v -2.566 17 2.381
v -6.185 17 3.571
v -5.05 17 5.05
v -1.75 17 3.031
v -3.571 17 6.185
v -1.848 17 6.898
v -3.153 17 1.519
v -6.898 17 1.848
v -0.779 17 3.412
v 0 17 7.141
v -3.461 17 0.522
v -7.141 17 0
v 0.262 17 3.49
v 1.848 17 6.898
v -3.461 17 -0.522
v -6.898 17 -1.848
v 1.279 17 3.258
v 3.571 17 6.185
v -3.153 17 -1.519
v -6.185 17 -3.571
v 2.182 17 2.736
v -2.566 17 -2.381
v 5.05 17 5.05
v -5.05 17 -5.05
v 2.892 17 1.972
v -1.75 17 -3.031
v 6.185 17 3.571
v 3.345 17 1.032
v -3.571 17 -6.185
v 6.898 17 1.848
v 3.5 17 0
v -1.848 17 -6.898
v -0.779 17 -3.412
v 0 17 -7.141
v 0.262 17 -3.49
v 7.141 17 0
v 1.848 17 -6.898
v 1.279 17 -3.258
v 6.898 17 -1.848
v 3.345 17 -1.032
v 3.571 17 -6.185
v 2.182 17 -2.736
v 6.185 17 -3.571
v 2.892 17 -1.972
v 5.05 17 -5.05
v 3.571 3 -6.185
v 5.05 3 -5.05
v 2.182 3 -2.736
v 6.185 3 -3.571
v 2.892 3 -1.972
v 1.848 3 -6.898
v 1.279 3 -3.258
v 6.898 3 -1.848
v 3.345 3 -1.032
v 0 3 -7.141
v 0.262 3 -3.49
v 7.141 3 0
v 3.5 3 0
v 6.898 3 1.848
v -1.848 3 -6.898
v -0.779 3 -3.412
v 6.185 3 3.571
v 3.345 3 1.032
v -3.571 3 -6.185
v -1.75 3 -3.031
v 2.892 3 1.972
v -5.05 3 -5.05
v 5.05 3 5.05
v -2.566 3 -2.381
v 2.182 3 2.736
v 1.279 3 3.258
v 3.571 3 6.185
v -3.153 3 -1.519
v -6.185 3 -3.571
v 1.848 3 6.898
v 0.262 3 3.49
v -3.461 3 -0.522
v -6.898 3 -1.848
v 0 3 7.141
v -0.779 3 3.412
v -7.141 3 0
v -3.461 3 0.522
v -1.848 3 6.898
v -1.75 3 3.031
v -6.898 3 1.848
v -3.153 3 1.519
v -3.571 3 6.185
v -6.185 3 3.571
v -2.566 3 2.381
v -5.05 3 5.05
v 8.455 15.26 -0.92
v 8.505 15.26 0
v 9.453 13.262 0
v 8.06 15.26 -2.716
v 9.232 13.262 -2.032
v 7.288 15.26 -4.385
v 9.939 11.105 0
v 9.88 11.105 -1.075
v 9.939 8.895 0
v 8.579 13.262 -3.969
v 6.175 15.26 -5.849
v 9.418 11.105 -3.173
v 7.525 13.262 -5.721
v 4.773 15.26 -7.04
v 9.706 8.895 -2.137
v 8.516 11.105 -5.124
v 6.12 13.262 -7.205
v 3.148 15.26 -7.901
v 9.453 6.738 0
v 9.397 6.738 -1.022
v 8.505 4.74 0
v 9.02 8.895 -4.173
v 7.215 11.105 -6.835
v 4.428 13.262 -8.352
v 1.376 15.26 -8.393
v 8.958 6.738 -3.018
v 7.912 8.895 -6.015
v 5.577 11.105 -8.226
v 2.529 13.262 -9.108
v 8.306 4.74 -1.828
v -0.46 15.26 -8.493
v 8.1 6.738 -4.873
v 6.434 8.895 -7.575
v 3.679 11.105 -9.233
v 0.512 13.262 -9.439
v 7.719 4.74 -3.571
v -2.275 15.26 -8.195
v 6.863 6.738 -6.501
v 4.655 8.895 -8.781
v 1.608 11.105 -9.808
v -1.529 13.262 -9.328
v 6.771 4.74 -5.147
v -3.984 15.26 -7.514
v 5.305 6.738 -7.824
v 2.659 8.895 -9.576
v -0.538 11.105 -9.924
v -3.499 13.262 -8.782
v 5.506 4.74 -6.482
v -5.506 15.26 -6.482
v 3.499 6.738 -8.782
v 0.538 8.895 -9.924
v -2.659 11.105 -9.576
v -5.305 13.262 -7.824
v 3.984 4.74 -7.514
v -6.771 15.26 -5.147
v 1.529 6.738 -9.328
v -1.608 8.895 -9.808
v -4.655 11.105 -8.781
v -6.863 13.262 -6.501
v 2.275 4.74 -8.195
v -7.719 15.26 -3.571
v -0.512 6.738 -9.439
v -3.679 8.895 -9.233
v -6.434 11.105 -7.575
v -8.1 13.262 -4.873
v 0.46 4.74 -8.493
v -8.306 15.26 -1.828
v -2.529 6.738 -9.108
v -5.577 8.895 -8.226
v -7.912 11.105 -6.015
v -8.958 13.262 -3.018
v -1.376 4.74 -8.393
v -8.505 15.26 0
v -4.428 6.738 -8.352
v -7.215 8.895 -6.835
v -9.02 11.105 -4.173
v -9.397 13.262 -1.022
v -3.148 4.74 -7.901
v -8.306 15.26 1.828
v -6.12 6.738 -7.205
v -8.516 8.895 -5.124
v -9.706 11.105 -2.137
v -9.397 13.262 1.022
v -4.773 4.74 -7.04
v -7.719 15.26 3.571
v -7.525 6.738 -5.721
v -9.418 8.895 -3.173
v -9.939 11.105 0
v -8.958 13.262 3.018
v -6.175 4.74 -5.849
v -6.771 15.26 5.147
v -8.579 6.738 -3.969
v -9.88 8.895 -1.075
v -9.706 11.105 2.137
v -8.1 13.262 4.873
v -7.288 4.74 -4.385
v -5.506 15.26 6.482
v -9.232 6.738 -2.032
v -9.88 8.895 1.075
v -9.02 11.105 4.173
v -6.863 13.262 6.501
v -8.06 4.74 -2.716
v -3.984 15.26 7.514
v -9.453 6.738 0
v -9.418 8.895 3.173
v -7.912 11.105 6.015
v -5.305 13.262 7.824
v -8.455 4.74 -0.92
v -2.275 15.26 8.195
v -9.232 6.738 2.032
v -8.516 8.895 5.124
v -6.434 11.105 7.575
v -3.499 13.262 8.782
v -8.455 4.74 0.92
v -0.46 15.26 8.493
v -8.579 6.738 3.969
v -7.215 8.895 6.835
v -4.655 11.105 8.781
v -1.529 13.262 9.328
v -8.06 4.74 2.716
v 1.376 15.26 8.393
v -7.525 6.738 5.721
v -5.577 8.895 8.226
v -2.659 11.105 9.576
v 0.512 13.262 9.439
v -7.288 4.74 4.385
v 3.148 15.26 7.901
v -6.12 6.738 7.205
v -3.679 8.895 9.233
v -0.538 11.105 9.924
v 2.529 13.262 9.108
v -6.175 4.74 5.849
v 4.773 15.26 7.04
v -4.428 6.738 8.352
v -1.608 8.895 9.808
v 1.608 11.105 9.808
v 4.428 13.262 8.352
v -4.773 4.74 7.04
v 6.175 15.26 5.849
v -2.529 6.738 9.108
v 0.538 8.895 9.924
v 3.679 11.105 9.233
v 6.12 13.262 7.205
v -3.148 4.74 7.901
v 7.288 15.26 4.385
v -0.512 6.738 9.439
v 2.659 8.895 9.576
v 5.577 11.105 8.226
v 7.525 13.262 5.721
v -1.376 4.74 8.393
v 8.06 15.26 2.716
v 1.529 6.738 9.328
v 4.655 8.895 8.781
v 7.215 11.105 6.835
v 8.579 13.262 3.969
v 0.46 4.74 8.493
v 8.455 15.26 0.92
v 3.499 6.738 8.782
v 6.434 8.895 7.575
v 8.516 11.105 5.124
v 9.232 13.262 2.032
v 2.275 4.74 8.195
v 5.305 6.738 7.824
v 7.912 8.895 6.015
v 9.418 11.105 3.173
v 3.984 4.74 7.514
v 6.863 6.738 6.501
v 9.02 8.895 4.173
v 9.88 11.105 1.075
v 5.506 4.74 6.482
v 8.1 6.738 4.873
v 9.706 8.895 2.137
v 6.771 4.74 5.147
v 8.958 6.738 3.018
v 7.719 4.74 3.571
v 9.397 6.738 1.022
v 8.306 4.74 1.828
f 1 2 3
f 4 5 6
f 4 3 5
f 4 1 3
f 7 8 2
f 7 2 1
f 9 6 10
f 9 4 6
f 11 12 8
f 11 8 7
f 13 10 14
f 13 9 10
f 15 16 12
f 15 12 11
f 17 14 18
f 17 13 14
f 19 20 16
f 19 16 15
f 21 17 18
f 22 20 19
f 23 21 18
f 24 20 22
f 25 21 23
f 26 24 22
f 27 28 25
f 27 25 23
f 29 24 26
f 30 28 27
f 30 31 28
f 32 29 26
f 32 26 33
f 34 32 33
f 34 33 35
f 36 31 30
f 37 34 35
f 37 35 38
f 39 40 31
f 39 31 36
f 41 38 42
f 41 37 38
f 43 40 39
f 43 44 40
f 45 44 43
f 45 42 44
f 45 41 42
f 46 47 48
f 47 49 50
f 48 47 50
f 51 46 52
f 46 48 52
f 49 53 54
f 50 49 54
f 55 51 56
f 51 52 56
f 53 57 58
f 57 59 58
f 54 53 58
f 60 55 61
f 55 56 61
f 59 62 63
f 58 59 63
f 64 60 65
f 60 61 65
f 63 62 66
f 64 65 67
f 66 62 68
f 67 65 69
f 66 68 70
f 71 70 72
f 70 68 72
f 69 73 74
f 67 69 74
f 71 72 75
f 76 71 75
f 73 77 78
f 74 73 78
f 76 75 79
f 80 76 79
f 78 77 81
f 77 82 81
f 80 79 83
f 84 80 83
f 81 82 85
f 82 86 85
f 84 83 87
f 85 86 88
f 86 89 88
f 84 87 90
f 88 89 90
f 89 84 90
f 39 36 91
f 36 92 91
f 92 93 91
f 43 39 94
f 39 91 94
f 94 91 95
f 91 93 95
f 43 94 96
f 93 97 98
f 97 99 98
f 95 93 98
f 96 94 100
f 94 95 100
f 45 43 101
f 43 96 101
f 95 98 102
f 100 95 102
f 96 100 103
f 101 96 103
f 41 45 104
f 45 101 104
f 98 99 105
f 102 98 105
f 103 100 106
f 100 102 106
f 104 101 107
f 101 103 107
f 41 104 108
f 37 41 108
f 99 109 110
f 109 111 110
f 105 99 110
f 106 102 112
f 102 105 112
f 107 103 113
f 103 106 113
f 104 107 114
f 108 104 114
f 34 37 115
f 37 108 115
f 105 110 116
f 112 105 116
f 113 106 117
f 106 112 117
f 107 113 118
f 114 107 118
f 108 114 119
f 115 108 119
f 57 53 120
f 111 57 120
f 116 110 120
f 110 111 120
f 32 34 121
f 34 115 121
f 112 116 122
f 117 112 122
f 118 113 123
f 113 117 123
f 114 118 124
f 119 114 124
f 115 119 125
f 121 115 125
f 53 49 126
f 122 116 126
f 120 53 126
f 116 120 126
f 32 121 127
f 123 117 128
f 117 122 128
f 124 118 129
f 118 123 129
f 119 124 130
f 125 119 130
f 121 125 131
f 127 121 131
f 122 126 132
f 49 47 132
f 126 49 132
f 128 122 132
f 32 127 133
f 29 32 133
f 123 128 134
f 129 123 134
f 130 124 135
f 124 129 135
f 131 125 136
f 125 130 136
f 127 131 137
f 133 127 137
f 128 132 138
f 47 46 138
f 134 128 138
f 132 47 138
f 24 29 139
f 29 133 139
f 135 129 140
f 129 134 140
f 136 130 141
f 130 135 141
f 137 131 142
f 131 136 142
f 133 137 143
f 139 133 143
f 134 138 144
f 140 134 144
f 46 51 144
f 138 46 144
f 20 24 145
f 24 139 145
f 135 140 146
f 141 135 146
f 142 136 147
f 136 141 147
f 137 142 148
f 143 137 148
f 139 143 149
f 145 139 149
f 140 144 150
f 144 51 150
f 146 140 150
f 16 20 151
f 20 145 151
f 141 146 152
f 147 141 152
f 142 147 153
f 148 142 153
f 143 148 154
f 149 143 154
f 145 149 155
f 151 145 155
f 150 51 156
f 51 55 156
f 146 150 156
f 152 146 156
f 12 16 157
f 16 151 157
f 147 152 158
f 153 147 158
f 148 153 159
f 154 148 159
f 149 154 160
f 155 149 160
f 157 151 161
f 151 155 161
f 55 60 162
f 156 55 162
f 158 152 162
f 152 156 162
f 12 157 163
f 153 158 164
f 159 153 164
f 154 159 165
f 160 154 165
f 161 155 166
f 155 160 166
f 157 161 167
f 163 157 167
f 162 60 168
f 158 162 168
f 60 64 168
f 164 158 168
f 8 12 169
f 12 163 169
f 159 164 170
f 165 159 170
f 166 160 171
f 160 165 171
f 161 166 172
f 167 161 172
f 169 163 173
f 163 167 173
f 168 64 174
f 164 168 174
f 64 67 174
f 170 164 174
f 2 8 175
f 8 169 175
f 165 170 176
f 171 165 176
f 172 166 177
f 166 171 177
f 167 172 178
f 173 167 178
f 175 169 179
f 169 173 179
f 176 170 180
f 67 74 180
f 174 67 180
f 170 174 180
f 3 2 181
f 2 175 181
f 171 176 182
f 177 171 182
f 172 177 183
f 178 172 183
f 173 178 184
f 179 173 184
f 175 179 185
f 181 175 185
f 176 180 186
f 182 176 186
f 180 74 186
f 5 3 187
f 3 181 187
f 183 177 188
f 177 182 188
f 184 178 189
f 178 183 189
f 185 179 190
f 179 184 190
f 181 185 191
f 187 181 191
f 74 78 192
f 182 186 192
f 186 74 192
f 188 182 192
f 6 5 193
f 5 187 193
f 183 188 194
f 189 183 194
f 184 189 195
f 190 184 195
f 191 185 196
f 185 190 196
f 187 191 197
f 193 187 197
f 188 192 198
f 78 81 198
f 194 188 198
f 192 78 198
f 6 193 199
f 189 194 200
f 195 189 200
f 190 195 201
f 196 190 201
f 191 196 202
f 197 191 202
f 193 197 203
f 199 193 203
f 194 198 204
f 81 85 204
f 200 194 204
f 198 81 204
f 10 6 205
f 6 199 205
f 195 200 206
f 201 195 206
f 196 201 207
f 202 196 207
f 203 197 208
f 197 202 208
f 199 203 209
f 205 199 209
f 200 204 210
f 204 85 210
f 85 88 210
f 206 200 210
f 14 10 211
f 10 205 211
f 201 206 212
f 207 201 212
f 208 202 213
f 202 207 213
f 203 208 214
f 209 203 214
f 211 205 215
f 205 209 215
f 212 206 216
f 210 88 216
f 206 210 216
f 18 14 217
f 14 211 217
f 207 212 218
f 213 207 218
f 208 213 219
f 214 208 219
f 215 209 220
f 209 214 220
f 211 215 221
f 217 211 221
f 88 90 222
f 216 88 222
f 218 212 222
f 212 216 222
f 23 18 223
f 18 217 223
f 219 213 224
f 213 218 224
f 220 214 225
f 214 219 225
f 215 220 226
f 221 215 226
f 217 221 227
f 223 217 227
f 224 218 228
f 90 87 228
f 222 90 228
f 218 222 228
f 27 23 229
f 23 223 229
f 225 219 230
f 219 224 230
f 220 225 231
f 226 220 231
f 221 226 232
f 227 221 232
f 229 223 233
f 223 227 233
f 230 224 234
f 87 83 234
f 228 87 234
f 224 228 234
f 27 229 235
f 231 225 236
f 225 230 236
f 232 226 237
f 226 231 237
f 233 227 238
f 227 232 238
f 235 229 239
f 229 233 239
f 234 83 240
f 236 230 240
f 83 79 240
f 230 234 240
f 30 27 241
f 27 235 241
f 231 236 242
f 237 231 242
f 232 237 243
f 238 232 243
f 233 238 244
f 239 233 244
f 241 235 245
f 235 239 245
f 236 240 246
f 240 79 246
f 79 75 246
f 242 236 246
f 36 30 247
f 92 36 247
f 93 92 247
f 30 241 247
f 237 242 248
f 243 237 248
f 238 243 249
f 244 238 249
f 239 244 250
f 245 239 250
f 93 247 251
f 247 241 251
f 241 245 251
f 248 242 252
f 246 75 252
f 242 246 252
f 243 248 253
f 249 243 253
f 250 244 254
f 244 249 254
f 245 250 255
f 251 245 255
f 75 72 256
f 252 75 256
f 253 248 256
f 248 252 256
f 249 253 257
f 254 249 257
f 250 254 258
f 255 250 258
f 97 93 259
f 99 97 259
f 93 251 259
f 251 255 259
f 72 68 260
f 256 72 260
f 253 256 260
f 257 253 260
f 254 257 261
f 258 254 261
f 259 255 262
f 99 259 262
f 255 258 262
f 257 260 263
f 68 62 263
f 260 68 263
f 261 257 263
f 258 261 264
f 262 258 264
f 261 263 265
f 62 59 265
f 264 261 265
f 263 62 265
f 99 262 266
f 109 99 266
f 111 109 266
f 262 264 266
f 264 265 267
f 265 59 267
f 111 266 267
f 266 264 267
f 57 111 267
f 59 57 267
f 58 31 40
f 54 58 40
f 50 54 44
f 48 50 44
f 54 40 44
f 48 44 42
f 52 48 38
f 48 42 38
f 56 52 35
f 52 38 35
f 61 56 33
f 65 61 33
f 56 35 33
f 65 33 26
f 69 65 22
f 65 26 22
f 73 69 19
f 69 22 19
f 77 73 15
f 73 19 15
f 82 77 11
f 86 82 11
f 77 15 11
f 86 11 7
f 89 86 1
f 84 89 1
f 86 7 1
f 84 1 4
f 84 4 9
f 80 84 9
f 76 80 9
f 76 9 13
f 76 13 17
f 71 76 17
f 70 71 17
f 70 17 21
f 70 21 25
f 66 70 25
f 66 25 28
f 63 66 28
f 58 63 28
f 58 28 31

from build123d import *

# Parameters (mm, degrees)
CUT_EXTRUDE1_DEPTH      = 11
CUT_EXTRUDE1_DEPTH_BACK = 11
SKETCH4_R               = 3.5
CUT_EXTRUDE2_DEPTH      = 15


with BuildPart() as part:
    # Sketch1 → Revolve1 (revolve)
    with BuildSketch(Plane.XY):
        with BuildLine():
            ThreePointArc((0, 20), (10, 10), (0, 0))
            Line((0, 0), (0, 20))
        make_face()
    revolve(axis=Axis((0, 0, 0), (0, 1, 0)))

    # Sketch3 → Cut-Extrude1 (cut, two sides)
    with BuildSketch(Plane.XY) as cut_extrude1_sk:
        Polygon((0, 17), (-8.309800503, 17), (-8.309800503, 20), (9.435235491, 20), (9.435235491, 17), align=None)
        Polygon((0, 0), (9.435235491, 0), (9.435235491, 3), (-8.578664685, 3), (-8.578664685, 0), align=None)
    extrude(amount=CUT_EXTRUDE1_DEPTH, mode=Mode.SUBTRACT)
    extrude(cut_extrude1_sk.sketch, amount=-CUT_EXTRUDE1_DEPTH_BACK, mode=Mode.SUBTRACT)

    # Sketch4 → Cut-Extrude2 (cut, through all)
    with BuildSketch(Plane(origin=(0, 17, 0), x_dir=(1, 0, 0), z_dir=(0, 1, 0))):
        Circle(SKETCH4_R)
    extrude(amount=-CUT_EXTRUDE2_DEPTH, mode=Mode.SUBTRACT)


solid = part.part
